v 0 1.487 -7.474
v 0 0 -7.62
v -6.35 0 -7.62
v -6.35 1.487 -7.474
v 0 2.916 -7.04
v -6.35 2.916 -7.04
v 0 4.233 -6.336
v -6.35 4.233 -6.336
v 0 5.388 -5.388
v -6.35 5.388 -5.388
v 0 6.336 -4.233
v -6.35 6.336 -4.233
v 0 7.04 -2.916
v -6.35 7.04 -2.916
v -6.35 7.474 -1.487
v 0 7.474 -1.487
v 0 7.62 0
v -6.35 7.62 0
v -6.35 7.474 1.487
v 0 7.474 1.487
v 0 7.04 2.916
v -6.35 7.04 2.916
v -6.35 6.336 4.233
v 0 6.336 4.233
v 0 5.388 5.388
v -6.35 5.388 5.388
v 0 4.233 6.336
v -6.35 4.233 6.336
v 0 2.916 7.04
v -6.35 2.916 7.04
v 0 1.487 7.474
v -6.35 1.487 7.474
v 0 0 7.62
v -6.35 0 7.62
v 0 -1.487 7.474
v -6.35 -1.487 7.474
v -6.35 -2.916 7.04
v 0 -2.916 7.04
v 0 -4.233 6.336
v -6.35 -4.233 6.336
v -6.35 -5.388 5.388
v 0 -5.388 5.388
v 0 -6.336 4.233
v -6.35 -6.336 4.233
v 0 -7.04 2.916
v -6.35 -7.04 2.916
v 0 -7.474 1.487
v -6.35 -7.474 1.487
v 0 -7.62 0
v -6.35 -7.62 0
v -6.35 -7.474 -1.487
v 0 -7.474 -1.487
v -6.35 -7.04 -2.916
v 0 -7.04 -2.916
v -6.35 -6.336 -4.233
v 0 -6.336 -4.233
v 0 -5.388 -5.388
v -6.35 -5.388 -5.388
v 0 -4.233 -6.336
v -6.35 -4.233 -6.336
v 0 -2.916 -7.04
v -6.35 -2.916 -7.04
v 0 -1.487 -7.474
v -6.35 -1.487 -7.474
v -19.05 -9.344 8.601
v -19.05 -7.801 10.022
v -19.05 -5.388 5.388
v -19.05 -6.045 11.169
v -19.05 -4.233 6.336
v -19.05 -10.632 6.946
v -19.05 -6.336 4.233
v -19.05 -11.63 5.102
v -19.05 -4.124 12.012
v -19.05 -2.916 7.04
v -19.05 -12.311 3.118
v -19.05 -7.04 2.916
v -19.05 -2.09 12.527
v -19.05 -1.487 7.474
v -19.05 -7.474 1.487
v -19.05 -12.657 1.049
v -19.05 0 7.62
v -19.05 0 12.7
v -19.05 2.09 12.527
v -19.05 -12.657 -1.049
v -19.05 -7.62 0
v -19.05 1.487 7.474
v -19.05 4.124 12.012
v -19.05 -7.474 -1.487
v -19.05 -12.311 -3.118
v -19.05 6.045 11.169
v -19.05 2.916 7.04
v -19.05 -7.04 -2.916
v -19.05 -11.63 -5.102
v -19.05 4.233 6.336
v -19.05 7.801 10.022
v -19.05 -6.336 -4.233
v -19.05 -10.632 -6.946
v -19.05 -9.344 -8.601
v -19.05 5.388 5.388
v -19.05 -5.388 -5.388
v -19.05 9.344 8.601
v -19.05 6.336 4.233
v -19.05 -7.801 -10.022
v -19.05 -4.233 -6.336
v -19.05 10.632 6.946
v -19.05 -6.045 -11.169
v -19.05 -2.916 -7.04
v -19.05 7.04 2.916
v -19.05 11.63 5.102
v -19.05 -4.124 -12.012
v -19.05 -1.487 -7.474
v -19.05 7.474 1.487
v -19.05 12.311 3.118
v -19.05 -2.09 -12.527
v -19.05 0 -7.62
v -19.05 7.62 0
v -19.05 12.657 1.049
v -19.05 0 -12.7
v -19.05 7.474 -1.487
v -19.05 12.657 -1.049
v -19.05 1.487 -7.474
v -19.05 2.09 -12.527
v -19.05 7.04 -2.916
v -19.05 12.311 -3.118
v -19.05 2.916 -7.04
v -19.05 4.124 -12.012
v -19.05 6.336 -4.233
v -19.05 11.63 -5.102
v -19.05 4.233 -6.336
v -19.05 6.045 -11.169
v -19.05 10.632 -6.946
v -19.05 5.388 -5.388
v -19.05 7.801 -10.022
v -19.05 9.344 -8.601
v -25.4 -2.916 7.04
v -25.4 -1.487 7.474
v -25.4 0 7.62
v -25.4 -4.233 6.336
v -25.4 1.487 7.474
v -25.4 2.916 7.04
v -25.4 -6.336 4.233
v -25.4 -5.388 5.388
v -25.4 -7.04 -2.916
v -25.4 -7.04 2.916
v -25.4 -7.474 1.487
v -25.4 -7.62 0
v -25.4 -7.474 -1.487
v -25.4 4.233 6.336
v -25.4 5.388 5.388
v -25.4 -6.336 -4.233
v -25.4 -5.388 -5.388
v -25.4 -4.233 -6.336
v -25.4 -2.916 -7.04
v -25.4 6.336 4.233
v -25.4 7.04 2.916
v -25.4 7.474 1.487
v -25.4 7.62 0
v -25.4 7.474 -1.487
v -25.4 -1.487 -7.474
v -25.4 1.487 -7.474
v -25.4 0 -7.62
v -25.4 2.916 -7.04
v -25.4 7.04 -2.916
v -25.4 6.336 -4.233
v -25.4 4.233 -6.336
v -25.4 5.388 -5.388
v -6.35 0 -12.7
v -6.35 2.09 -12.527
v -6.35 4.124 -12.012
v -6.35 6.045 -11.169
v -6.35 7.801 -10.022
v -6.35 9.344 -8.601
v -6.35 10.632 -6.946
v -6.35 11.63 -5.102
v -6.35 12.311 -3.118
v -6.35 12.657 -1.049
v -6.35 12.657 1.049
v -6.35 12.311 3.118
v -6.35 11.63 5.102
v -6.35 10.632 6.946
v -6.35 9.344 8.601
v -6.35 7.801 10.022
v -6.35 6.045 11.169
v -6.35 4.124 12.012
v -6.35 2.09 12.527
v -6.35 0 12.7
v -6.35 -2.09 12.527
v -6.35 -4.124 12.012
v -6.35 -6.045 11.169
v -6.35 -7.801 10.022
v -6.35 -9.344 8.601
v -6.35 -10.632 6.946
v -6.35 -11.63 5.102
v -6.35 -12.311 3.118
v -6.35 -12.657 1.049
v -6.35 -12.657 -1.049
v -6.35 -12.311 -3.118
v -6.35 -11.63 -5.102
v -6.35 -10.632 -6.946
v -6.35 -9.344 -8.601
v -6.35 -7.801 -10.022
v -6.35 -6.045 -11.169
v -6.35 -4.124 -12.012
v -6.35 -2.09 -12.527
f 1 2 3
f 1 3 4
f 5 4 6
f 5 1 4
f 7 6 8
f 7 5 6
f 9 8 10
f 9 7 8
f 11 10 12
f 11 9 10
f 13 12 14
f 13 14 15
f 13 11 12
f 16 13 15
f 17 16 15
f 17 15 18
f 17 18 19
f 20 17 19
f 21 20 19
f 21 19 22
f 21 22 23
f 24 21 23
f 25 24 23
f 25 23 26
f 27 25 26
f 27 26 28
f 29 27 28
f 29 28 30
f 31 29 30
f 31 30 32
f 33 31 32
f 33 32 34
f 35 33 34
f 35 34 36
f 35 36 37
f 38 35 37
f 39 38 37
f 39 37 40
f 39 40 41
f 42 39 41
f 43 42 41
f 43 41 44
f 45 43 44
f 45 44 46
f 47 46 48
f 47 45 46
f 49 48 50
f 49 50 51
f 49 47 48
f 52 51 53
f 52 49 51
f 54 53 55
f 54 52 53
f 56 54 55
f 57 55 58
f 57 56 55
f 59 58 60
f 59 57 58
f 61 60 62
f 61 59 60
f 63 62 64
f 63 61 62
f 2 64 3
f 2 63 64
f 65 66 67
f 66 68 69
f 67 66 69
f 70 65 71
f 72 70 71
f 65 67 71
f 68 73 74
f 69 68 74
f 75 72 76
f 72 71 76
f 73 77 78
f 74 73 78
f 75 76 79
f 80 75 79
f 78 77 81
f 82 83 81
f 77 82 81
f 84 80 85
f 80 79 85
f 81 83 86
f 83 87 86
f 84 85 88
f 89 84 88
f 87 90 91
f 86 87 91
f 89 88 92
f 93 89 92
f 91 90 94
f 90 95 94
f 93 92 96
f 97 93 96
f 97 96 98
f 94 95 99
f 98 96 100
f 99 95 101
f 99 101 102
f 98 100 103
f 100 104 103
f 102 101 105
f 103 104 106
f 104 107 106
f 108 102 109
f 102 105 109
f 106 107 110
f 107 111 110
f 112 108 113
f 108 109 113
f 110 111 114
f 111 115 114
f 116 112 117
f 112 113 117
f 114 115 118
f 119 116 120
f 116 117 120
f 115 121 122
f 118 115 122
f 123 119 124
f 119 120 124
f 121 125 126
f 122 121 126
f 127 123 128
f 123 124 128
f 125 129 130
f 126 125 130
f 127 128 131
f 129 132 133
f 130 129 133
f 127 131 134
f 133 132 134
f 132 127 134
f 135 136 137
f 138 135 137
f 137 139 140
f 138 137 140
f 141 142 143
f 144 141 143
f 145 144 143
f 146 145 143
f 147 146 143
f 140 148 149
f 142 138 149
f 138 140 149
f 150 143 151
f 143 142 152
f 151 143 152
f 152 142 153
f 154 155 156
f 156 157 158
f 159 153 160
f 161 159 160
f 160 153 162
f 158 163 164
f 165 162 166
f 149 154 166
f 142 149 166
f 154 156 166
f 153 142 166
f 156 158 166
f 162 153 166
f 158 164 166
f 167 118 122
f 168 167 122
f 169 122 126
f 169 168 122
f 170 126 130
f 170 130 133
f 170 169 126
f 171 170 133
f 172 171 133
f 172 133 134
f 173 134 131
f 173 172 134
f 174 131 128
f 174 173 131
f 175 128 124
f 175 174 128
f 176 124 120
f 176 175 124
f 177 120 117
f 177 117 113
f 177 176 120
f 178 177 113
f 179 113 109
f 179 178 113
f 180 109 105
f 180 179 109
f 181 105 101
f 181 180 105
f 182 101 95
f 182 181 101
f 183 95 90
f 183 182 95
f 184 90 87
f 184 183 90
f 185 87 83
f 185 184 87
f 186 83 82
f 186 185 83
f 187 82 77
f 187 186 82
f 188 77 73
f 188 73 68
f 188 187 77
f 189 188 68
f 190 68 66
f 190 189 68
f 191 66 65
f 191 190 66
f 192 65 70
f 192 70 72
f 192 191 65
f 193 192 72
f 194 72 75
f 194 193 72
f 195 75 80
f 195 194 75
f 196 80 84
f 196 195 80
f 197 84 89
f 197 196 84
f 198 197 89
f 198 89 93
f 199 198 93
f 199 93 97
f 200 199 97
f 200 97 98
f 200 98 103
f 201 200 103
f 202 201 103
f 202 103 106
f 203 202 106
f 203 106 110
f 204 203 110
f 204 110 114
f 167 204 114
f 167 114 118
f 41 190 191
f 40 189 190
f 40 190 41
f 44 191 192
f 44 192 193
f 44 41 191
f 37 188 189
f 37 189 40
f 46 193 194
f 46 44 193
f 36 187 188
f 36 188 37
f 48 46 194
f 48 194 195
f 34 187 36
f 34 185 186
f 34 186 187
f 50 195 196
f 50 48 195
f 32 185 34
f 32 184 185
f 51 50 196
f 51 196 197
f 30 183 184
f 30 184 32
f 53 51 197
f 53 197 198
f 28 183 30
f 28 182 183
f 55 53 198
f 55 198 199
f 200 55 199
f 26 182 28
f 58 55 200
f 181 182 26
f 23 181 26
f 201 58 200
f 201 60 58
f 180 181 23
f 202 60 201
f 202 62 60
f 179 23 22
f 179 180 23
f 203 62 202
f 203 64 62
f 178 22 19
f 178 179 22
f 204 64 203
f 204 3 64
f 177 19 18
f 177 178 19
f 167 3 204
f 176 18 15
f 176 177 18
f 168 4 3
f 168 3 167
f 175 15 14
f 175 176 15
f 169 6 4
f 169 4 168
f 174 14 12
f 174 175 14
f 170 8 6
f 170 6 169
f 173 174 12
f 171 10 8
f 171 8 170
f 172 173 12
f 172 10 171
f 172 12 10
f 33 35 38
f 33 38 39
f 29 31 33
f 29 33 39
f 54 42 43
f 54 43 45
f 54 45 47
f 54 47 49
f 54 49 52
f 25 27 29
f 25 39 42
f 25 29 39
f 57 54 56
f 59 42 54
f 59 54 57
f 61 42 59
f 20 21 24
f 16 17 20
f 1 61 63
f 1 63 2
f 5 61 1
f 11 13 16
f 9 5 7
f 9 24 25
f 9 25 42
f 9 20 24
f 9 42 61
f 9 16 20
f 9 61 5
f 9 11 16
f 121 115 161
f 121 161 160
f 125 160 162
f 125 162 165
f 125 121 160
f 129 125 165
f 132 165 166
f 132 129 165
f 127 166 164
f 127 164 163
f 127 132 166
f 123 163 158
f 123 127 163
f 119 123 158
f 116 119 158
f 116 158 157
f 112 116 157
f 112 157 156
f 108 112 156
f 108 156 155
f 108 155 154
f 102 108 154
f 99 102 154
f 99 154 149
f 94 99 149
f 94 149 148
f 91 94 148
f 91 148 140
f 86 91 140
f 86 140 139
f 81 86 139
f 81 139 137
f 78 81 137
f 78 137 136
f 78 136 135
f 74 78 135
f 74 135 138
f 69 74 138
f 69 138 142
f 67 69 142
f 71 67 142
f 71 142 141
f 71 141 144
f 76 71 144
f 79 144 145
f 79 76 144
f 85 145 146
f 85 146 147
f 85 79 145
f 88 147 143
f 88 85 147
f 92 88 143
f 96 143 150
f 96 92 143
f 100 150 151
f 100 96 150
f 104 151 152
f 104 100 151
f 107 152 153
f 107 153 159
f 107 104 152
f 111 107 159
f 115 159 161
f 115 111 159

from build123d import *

# Parameters (mm, degrees)
SKETCH1_R           = 7.62
BOSS_EXTRUDE1_DEPTH = 25.4
SKETCH2_R           = 12.7
BOSS_EXTRUDE2_DEPTH = 6.35


with BuildPart() as part:
    # Sketch1 → Boss-Extrude1 (new body)
    with BuildSketch(Plane(origin=(0, 0, 0), x_dir=(0, 0, -1), z_dir=(1, 0, 0))):
        Circle(SKETCH1_R)
    extrude(amount=-BOSS_EXTRUDE1_DEPTH)

    # Sketch2 → Boss-Extrude2 (add, symmetric)
    with BuildSketch(Plane(origin=(-12.7, 0, 0), x_dir=(0, 0, -1), z_dir=(1, 0, 0))):
        Circle(SKETCH2_R)
    extrude(amount=BOSS_EXTRUDE2_DEPTH, both=True)


solid = part.part
